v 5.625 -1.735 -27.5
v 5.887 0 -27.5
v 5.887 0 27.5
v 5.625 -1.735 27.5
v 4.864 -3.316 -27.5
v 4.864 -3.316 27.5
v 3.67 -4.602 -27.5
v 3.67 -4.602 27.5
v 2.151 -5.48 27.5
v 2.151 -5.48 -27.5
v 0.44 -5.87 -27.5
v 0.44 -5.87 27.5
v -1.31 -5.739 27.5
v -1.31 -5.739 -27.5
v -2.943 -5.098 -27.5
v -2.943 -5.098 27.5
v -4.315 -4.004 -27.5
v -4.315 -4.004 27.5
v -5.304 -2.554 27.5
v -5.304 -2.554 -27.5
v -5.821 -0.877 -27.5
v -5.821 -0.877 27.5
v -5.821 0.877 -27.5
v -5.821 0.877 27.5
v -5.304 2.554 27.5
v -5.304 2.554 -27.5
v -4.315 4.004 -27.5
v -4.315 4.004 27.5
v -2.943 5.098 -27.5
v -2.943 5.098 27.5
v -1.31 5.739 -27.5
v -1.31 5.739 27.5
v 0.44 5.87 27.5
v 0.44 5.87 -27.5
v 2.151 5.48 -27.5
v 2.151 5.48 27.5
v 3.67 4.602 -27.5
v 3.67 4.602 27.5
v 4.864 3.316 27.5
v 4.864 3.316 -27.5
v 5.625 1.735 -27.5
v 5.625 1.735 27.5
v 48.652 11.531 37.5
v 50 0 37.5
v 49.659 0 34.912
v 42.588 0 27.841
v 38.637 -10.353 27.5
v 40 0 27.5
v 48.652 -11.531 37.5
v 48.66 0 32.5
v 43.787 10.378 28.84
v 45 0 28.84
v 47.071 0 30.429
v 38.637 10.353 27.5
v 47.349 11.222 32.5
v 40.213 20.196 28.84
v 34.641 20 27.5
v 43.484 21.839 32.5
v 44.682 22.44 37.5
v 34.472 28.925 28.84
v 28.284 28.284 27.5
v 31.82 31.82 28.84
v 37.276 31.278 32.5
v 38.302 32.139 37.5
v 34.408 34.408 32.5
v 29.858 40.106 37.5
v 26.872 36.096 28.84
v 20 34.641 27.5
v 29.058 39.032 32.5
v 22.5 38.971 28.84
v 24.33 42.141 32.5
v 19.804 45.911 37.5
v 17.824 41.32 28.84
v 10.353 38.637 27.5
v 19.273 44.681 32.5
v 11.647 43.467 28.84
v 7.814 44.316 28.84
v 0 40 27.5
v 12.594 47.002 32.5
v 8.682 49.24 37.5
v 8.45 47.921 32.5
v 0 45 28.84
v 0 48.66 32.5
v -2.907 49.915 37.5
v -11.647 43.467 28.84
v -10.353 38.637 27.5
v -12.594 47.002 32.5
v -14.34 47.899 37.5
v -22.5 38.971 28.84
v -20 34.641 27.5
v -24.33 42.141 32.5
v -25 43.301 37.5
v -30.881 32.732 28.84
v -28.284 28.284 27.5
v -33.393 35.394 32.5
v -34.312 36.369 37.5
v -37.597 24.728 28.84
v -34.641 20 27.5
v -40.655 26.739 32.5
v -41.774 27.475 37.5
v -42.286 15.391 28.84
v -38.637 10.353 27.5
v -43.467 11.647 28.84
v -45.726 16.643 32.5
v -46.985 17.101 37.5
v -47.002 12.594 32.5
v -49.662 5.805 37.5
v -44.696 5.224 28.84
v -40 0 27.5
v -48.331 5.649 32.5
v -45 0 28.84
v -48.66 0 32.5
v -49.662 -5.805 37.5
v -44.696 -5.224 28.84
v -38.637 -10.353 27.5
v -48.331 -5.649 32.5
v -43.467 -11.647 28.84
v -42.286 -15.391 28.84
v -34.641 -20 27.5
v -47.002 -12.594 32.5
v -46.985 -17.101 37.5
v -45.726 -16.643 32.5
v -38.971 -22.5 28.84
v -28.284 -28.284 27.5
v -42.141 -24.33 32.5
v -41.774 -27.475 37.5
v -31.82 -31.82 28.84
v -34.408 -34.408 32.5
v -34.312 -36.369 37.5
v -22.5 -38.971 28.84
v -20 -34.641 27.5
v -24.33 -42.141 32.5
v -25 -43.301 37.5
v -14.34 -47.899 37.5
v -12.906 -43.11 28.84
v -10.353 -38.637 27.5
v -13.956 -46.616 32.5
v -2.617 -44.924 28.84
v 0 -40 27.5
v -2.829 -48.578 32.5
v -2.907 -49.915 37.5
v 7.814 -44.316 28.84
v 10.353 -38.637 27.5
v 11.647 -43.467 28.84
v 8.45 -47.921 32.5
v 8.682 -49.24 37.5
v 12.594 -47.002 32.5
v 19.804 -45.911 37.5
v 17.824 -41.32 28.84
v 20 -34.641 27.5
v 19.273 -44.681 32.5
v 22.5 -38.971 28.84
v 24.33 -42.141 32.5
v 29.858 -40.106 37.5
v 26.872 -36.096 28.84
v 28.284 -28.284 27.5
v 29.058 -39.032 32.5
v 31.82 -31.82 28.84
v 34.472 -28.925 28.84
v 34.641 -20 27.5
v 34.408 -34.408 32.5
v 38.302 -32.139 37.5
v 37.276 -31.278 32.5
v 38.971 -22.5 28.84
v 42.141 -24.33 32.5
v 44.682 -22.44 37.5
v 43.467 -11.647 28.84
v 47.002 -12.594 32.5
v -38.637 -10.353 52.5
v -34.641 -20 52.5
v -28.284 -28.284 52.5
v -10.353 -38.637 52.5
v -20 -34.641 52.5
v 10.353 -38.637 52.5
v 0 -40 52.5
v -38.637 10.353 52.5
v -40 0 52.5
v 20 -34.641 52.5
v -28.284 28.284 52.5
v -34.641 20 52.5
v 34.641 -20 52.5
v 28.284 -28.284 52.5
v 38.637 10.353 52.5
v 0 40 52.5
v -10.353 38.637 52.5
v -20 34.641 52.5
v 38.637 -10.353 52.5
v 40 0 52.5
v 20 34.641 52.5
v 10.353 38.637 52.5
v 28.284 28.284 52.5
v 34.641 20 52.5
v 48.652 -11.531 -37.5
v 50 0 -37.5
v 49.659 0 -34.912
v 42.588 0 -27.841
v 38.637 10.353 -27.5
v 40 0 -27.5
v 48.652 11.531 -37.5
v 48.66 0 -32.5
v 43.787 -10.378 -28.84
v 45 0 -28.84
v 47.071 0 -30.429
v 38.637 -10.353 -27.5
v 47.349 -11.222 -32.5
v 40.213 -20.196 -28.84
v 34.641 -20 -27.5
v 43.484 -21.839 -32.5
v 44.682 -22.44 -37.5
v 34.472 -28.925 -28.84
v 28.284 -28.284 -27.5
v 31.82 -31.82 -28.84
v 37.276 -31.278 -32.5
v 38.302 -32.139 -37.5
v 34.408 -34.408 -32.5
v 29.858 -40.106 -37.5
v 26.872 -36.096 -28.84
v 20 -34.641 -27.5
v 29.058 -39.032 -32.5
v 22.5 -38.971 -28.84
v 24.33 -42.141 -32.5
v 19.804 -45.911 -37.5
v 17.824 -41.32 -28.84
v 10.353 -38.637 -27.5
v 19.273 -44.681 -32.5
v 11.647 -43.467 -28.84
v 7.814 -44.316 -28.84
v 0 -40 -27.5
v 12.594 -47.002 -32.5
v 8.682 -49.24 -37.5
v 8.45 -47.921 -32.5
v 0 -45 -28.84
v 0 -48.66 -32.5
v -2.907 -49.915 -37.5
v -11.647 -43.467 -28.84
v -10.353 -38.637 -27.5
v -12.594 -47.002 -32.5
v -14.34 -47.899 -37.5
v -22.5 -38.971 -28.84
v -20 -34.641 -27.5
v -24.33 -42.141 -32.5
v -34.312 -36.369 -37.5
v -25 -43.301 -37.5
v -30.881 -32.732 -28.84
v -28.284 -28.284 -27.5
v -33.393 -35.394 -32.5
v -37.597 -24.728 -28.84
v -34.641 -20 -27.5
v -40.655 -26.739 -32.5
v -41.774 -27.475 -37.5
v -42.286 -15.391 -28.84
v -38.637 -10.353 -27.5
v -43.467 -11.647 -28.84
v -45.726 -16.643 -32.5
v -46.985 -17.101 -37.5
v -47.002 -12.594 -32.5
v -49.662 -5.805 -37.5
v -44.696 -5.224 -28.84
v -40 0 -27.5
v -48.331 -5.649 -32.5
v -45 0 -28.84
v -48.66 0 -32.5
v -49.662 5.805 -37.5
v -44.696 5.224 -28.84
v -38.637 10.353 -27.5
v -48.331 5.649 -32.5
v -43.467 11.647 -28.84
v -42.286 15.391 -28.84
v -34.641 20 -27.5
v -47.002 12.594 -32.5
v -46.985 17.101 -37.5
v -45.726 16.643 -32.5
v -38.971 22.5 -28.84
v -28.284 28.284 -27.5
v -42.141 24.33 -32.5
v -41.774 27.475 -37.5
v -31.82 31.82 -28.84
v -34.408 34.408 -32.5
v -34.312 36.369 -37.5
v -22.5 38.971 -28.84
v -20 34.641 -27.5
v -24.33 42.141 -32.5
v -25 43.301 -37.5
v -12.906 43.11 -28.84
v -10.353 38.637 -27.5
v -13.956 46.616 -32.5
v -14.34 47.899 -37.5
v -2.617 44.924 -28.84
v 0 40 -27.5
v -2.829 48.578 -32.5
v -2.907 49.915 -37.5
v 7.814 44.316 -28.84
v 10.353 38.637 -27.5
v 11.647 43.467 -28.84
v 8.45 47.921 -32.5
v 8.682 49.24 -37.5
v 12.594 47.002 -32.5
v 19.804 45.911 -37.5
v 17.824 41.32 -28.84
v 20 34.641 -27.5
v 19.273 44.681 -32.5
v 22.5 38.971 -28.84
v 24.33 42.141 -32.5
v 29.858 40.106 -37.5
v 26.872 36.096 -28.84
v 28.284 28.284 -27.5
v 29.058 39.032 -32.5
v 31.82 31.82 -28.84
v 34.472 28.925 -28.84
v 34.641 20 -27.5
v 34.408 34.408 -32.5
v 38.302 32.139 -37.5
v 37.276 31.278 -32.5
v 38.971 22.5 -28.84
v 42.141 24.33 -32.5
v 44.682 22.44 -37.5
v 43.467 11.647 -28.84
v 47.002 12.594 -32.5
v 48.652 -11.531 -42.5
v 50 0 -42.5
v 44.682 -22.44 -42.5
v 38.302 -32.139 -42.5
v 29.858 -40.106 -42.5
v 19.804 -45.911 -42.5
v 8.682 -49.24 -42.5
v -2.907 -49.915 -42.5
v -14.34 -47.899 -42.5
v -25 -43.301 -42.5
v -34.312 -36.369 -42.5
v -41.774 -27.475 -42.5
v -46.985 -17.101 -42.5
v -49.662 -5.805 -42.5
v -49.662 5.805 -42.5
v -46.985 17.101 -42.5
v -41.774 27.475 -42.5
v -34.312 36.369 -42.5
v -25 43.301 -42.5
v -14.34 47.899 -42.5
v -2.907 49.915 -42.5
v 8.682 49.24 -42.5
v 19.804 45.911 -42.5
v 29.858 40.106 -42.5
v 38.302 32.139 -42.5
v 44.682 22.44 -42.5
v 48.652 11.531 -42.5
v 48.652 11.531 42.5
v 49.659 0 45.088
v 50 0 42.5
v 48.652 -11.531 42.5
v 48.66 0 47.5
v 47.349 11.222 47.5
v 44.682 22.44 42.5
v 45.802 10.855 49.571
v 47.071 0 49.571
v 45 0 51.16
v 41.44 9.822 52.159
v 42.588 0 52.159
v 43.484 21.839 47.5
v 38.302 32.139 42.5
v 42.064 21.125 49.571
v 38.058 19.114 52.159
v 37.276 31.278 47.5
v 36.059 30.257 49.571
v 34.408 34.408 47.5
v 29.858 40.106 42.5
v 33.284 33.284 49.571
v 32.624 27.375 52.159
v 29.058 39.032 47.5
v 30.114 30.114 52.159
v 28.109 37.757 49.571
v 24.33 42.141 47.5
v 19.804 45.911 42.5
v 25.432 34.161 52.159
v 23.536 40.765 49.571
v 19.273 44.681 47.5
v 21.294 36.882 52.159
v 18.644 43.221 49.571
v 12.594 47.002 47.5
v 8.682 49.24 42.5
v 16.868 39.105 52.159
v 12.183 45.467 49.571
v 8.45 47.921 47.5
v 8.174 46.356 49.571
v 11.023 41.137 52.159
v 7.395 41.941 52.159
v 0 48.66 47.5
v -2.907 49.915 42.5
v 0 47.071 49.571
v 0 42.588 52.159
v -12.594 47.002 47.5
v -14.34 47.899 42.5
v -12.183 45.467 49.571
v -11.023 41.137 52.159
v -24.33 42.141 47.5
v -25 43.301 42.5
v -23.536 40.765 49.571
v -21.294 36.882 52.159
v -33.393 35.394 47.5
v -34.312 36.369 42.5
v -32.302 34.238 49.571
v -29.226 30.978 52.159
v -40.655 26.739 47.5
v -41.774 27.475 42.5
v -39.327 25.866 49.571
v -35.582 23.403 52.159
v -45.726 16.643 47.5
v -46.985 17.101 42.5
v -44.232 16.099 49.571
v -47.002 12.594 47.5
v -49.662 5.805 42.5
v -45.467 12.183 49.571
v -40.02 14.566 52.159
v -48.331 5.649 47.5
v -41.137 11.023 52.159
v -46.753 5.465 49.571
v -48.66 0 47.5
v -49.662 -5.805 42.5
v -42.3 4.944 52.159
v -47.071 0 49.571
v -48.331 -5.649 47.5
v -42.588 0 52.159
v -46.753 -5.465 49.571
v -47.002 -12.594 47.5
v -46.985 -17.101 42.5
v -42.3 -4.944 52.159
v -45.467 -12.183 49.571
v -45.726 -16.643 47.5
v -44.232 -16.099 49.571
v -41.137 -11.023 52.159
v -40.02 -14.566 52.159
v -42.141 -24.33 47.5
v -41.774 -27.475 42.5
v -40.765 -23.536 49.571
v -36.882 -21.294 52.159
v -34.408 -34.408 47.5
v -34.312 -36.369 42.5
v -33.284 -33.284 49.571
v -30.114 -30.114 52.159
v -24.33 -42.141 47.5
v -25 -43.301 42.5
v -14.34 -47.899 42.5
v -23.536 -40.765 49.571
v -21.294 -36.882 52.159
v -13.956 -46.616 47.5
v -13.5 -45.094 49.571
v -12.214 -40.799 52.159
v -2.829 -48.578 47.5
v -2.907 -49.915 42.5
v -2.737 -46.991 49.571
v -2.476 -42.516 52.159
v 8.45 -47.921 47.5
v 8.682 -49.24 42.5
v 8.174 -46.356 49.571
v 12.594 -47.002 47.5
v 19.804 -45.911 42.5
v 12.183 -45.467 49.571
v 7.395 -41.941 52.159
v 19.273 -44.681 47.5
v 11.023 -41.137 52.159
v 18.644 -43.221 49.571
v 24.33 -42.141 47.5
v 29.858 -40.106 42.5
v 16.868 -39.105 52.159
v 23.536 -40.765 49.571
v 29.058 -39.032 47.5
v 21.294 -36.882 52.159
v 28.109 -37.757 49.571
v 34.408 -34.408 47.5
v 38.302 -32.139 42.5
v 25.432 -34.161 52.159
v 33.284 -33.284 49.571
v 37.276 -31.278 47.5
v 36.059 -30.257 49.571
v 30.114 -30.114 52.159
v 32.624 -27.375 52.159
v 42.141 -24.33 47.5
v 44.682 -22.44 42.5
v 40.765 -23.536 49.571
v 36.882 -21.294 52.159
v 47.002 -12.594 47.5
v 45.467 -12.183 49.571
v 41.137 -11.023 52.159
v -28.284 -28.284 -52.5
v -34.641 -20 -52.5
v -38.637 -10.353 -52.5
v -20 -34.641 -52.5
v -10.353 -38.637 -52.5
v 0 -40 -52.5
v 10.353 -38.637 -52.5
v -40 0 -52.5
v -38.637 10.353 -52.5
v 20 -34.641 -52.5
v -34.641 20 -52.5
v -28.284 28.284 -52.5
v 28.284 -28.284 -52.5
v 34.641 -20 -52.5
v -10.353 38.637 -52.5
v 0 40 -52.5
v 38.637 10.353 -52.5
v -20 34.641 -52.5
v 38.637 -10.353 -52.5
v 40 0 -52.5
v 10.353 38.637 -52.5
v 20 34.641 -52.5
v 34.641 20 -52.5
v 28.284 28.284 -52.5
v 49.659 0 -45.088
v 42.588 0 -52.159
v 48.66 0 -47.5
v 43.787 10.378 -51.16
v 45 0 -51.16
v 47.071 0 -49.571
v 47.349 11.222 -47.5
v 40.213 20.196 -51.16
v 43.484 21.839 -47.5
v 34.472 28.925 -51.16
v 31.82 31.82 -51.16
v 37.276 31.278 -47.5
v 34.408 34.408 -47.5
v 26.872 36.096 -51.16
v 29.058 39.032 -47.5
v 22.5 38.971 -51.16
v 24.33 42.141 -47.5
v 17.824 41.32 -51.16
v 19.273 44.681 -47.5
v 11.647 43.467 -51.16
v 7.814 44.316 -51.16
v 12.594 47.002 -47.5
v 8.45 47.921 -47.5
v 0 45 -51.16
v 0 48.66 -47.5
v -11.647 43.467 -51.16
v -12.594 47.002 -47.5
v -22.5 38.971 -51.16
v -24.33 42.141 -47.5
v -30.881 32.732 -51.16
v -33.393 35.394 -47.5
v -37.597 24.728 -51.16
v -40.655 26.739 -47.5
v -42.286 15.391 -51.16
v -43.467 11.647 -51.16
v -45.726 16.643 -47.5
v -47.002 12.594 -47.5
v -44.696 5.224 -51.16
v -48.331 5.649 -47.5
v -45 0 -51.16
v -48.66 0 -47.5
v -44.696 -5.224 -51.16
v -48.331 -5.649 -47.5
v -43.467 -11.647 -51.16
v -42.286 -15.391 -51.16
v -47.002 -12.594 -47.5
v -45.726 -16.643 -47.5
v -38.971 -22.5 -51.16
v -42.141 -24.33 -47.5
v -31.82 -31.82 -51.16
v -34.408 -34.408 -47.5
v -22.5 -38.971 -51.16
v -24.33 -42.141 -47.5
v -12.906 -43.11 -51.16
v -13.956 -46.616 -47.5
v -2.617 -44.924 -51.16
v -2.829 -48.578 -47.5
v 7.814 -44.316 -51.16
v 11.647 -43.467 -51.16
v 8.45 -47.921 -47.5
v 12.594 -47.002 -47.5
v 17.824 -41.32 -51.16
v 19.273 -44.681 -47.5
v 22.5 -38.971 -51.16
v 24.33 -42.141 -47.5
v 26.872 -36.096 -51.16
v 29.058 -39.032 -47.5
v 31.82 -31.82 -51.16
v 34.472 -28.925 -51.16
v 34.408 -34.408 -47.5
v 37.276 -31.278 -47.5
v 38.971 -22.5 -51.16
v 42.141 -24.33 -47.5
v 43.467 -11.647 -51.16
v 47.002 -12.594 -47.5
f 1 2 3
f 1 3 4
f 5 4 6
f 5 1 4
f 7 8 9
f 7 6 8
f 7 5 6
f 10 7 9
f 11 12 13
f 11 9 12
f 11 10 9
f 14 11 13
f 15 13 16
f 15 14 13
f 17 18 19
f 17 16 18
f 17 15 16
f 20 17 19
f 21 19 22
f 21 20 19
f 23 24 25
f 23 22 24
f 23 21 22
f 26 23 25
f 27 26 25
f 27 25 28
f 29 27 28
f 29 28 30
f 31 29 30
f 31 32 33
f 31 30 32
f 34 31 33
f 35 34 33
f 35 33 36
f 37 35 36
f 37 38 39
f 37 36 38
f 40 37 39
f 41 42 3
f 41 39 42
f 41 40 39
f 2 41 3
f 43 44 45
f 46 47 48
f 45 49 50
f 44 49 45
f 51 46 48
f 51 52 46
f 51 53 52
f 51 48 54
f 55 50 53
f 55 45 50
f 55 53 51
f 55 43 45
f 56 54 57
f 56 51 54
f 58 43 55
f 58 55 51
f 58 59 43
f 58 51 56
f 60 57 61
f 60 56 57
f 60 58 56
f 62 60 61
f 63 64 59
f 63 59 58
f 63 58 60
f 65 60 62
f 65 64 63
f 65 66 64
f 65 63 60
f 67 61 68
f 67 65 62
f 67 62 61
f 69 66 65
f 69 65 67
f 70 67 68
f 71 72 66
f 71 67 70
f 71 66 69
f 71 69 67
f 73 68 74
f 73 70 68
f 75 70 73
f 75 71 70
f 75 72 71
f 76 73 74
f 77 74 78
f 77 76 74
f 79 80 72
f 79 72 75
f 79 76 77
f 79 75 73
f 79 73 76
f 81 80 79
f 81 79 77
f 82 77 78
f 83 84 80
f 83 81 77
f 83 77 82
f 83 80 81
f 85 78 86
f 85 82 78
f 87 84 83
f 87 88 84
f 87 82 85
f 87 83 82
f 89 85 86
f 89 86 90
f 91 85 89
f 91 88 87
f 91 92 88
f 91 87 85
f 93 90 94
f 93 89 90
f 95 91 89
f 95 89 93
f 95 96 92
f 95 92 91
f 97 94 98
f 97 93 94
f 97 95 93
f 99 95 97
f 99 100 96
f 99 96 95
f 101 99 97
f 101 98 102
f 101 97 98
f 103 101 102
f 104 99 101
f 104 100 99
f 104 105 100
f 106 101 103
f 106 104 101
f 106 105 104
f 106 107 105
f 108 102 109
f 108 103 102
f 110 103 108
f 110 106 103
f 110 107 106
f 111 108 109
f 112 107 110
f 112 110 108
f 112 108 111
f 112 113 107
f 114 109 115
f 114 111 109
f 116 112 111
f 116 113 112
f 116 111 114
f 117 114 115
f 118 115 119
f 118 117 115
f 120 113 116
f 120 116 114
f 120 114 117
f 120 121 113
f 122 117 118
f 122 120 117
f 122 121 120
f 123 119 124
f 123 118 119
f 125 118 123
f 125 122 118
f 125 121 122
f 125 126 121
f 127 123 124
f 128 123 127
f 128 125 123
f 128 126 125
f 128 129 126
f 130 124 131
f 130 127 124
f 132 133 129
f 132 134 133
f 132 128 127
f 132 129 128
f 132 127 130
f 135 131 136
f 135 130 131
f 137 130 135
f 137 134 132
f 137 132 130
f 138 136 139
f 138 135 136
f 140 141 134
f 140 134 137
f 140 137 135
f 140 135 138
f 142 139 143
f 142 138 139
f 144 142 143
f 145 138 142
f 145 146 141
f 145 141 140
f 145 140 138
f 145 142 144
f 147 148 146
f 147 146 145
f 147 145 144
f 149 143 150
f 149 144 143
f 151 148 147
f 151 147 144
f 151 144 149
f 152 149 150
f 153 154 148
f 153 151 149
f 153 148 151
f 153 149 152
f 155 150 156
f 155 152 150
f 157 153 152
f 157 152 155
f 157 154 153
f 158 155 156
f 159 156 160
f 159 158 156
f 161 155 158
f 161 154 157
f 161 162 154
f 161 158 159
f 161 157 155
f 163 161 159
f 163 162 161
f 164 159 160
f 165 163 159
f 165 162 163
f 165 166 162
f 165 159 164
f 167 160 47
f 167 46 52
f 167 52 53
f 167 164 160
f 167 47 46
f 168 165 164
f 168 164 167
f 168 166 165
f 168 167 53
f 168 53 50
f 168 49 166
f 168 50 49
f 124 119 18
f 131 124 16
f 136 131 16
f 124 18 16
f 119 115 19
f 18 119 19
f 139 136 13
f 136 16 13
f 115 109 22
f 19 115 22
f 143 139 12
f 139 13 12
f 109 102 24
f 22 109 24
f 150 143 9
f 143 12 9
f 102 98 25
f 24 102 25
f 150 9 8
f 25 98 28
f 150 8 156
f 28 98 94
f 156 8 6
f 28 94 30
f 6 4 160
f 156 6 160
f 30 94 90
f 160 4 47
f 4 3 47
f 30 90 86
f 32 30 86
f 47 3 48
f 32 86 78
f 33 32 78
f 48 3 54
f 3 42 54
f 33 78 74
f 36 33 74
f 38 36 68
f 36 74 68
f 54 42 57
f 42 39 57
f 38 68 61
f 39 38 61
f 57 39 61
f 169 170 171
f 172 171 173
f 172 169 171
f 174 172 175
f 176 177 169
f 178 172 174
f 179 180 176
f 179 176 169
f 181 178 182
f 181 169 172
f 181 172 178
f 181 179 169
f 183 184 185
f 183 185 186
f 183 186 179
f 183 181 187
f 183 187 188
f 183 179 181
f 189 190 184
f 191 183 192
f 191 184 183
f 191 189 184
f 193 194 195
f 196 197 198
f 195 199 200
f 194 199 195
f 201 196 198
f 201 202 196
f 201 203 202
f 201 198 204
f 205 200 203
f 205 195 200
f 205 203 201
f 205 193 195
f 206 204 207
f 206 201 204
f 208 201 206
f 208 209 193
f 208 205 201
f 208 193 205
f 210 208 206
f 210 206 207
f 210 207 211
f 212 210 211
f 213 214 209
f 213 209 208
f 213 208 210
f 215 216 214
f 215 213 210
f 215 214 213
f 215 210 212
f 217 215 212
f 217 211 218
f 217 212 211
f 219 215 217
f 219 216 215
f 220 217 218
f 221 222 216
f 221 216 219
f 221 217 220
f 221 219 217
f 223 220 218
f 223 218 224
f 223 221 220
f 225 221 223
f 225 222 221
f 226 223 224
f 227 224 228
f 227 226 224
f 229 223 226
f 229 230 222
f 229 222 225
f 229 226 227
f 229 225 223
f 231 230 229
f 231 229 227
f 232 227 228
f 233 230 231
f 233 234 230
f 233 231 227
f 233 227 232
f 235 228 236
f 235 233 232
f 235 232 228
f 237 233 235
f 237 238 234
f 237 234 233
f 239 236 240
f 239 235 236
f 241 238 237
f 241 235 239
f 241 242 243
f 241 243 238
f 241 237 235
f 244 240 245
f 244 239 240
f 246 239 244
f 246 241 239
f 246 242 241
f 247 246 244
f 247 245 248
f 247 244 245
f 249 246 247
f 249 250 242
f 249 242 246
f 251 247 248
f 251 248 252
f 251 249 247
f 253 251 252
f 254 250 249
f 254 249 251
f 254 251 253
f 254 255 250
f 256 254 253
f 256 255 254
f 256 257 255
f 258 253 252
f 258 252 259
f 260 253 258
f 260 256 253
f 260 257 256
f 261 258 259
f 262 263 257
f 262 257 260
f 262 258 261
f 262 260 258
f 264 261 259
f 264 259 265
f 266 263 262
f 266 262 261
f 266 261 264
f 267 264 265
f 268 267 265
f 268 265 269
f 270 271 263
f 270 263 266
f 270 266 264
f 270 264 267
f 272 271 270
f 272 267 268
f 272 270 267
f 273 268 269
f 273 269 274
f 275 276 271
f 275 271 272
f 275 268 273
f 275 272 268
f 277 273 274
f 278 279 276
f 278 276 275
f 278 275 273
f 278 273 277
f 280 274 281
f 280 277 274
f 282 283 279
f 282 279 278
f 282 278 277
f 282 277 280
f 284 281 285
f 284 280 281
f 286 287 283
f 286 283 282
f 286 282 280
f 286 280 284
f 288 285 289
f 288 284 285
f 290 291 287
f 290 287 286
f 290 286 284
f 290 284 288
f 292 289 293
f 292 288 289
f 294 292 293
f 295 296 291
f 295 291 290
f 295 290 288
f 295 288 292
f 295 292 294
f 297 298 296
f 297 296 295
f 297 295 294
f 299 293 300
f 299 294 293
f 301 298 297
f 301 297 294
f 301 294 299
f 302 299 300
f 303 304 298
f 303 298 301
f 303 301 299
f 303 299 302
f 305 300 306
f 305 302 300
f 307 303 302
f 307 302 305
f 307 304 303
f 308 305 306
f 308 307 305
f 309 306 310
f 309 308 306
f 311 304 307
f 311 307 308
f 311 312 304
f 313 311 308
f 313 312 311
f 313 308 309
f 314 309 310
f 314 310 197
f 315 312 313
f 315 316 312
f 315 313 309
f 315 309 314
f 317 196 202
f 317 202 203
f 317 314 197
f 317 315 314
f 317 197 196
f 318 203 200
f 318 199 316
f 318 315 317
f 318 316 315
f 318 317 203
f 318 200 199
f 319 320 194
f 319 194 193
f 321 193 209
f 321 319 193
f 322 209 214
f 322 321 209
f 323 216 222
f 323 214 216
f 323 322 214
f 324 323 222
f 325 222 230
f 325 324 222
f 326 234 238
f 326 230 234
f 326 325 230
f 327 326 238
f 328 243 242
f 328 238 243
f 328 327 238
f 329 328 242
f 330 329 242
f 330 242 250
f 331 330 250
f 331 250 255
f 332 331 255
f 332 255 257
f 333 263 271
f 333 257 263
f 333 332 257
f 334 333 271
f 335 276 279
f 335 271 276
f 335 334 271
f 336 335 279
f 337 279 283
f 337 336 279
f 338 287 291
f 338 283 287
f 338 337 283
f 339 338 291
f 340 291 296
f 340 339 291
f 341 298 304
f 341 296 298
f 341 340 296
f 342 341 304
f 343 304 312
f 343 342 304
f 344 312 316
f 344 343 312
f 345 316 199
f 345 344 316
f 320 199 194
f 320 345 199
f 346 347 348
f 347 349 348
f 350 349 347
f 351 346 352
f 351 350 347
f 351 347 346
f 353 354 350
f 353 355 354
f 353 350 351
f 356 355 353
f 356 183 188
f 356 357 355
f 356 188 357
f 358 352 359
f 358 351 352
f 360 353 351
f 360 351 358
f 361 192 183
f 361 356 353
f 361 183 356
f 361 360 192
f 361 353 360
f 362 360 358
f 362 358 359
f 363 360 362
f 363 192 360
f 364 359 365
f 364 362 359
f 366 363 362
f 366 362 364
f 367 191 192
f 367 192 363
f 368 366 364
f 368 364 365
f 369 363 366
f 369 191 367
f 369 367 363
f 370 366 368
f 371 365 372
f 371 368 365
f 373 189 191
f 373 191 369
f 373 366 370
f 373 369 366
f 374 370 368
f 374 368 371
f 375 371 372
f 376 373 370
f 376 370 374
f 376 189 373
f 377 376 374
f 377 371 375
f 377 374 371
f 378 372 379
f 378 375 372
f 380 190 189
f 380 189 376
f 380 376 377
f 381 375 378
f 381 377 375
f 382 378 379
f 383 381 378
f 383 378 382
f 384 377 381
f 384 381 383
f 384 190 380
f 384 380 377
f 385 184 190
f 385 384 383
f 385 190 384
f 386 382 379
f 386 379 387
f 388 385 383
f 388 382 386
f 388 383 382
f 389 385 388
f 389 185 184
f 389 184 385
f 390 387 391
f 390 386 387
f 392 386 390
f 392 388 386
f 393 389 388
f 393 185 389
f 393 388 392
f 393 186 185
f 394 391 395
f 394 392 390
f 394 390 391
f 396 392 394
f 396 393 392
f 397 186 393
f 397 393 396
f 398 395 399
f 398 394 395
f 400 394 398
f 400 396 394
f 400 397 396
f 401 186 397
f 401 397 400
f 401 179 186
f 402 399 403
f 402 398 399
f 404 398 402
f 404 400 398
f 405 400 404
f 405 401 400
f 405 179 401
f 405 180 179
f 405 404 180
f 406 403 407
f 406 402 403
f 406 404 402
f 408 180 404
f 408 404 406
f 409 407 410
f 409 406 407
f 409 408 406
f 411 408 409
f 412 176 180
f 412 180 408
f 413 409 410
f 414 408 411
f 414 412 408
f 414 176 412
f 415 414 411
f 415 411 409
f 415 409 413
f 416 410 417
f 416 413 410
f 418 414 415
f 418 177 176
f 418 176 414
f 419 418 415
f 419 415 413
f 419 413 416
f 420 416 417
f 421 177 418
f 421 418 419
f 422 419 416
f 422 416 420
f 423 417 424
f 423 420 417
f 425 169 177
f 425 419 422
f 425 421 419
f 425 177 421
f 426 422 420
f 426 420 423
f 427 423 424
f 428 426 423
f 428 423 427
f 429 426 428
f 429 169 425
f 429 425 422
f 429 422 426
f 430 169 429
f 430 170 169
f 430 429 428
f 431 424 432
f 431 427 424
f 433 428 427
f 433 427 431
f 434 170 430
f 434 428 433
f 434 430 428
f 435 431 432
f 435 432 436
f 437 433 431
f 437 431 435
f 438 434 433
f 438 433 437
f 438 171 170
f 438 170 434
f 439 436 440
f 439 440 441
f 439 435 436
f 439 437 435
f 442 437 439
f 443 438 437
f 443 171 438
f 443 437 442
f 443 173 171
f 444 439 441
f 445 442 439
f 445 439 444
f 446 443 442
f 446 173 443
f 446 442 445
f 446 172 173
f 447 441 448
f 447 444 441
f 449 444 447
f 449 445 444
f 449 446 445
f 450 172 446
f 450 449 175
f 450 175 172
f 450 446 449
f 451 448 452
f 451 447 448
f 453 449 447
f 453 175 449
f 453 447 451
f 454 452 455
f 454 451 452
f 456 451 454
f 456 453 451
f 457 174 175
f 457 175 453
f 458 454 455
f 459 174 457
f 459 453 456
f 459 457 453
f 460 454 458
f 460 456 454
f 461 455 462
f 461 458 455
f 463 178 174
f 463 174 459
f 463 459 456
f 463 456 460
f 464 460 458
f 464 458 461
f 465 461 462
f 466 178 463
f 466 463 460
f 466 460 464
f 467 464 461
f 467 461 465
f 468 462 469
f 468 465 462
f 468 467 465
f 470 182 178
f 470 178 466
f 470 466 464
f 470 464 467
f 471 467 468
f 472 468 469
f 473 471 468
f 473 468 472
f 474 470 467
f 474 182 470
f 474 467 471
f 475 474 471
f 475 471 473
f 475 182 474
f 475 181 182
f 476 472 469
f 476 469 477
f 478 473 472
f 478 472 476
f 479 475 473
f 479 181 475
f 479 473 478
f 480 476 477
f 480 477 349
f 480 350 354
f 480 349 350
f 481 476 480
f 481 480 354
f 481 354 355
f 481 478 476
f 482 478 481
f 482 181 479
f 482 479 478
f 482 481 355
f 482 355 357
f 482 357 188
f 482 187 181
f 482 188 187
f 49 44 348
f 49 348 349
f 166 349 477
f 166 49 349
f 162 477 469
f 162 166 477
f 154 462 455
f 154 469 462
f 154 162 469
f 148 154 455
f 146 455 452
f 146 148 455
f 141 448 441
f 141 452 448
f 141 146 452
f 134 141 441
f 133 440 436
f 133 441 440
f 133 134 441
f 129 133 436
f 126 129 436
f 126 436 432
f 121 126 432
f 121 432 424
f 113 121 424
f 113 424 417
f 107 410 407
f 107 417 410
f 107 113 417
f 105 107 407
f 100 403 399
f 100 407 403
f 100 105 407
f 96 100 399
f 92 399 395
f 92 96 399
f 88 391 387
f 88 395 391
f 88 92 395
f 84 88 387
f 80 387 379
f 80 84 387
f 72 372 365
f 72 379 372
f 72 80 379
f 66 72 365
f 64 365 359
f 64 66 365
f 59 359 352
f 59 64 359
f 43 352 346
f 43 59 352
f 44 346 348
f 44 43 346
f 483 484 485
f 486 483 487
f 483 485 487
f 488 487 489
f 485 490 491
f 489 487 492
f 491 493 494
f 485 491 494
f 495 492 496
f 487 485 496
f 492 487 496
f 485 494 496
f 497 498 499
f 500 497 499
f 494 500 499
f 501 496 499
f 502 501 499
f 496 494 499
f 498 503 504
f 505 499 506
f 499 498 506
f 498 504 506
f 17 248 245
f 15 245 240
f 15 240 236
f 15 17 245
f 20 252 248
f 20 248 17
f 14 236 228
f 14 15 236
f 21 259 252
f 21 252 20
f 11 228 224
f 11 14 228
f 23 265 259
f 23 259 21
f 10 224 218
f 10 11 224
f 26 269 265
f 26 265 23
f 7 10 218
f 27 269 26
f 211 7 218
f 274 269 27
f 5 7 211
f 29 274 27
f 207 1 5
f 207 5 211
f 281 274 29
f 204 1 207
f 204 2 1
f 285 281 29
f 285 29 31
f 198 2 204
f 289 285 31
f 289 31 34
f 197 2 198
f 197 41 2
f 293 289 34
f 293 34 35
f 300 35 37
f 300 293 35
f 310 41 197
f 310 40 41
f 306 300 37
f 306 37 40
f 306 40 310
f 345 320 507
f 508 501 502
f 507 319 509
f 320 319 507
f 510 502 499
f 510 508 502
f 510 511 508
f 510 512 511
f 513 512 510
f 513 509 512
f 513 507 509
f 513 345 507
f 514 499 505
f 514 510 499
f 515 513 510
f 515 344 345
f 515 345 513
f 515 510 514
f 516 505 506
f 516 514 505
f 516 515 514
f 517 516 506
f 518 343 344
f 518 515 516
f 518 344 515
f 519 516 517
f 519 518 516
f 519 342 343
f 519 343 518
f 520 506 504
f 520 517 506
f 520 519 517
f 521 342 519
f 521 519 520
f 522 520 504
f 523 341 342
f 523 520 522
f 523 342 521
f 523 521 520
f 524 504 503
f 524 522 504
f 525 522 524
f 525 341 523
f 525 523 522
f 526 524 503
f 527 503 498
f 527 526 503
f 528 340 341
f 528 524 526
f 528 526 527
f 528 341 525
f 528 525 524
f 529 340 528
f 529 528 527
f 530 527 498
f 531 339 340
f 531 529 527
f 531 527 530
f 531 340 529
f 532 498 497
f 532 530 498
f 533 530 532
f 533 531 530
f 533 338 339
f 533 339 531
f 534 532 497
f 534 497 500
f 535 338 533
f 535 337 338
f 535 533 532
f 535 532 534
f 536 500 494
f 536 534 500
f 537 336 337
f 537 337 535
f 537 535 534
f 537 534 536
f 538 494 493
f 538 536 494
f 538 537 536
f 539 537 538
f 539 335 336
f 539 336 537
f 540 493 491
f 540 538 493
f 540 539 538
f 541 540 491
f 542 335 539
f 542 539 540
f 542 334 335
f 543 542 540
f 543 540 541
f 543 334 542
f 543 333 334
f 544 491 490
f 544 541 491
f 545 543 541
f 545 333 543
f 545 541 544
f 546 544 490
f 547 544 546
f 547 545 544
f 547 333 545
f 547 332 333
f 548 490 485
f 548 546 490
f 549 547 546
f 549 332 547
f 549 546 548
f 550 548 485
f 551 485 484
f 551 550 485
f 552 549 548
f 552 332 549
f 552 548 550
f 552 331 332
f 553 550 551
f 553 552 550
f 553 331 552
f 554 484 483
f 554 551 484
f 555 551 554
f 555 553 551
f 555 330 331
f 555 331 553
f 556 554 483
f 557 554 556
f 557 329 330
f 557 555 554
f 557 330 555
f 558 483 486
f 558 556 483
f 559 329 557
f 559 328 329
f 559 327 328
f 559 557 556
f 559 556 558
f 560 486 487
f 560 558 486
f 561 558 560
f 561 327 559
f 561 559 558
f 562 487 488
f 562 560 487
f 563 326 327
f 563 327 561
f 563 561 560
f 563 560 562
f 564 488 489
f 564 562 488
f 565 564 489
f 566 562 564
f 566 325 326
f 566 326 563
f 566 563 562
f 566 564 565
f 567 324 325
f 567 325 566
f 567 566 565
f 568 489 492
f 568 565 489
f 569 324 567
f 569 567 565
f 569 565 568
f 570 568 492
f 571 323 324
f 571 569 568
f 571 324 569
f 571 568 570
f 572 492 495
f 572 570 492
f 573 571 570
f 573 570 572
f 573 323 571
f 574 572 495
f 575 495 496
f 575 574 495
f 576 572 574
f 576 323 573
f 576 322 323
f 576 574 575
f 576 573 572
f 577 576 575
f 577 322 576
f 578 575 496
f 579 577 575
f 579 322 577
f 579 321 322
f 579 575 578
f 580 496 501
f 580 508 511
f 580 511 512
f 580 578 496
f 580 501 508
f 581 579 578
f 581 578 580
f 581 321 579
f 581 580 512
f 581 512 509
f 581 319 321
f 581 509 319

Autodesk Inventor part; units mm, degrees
ref_plane "YZ Plane" through (0, 0, 0) normal (1, 0, 0) x (0, 1, 0)
ref_plane "XZ Plane" through (0, 0, 0) normal (0, 1, 0) x (-1, 0, 0)
ref_plane "XY Plane" through (0, 0, 0) normal (0, 0, 1) x (1, 0, 0)
sketch "Sketch1" plane through (0, 0, 0) normal (0, 1, 0) x (-1, 0, 0)
  line L0 (-50, -27.5) -> (-50, -52.5)
  line L1 (-50, -52.5) -> (0, -52.5)
  line L2 (0, 52.5) -> (-50, 52.5)
  line L3 (-50, 52.5) -> (-50, 27.5)
  line L4 (-50, 27.5) -> (-5.8866, 27.5)
  line L5 (-5.8866, -27.5) -> (-50, -27.5)
  line L6 (-5.8866, 27.5) -> (-5.8866, -27.5)
  line L7 (0, -52.5) -> (0, 52.5)
  point P0 (0, 0)
revolve "Revolution1" add sketch "Sketch1" angle 360 about axis through (0, 0, -52.5) along (0, 0, 1)
fillet "Fillet1" radius 10 4 edges at (-50, 0, 27.5) (-50, 0, -27.5) (-50, 0, -52.5) (-50, 0, 52.5)
properties part number "WHEEL"
